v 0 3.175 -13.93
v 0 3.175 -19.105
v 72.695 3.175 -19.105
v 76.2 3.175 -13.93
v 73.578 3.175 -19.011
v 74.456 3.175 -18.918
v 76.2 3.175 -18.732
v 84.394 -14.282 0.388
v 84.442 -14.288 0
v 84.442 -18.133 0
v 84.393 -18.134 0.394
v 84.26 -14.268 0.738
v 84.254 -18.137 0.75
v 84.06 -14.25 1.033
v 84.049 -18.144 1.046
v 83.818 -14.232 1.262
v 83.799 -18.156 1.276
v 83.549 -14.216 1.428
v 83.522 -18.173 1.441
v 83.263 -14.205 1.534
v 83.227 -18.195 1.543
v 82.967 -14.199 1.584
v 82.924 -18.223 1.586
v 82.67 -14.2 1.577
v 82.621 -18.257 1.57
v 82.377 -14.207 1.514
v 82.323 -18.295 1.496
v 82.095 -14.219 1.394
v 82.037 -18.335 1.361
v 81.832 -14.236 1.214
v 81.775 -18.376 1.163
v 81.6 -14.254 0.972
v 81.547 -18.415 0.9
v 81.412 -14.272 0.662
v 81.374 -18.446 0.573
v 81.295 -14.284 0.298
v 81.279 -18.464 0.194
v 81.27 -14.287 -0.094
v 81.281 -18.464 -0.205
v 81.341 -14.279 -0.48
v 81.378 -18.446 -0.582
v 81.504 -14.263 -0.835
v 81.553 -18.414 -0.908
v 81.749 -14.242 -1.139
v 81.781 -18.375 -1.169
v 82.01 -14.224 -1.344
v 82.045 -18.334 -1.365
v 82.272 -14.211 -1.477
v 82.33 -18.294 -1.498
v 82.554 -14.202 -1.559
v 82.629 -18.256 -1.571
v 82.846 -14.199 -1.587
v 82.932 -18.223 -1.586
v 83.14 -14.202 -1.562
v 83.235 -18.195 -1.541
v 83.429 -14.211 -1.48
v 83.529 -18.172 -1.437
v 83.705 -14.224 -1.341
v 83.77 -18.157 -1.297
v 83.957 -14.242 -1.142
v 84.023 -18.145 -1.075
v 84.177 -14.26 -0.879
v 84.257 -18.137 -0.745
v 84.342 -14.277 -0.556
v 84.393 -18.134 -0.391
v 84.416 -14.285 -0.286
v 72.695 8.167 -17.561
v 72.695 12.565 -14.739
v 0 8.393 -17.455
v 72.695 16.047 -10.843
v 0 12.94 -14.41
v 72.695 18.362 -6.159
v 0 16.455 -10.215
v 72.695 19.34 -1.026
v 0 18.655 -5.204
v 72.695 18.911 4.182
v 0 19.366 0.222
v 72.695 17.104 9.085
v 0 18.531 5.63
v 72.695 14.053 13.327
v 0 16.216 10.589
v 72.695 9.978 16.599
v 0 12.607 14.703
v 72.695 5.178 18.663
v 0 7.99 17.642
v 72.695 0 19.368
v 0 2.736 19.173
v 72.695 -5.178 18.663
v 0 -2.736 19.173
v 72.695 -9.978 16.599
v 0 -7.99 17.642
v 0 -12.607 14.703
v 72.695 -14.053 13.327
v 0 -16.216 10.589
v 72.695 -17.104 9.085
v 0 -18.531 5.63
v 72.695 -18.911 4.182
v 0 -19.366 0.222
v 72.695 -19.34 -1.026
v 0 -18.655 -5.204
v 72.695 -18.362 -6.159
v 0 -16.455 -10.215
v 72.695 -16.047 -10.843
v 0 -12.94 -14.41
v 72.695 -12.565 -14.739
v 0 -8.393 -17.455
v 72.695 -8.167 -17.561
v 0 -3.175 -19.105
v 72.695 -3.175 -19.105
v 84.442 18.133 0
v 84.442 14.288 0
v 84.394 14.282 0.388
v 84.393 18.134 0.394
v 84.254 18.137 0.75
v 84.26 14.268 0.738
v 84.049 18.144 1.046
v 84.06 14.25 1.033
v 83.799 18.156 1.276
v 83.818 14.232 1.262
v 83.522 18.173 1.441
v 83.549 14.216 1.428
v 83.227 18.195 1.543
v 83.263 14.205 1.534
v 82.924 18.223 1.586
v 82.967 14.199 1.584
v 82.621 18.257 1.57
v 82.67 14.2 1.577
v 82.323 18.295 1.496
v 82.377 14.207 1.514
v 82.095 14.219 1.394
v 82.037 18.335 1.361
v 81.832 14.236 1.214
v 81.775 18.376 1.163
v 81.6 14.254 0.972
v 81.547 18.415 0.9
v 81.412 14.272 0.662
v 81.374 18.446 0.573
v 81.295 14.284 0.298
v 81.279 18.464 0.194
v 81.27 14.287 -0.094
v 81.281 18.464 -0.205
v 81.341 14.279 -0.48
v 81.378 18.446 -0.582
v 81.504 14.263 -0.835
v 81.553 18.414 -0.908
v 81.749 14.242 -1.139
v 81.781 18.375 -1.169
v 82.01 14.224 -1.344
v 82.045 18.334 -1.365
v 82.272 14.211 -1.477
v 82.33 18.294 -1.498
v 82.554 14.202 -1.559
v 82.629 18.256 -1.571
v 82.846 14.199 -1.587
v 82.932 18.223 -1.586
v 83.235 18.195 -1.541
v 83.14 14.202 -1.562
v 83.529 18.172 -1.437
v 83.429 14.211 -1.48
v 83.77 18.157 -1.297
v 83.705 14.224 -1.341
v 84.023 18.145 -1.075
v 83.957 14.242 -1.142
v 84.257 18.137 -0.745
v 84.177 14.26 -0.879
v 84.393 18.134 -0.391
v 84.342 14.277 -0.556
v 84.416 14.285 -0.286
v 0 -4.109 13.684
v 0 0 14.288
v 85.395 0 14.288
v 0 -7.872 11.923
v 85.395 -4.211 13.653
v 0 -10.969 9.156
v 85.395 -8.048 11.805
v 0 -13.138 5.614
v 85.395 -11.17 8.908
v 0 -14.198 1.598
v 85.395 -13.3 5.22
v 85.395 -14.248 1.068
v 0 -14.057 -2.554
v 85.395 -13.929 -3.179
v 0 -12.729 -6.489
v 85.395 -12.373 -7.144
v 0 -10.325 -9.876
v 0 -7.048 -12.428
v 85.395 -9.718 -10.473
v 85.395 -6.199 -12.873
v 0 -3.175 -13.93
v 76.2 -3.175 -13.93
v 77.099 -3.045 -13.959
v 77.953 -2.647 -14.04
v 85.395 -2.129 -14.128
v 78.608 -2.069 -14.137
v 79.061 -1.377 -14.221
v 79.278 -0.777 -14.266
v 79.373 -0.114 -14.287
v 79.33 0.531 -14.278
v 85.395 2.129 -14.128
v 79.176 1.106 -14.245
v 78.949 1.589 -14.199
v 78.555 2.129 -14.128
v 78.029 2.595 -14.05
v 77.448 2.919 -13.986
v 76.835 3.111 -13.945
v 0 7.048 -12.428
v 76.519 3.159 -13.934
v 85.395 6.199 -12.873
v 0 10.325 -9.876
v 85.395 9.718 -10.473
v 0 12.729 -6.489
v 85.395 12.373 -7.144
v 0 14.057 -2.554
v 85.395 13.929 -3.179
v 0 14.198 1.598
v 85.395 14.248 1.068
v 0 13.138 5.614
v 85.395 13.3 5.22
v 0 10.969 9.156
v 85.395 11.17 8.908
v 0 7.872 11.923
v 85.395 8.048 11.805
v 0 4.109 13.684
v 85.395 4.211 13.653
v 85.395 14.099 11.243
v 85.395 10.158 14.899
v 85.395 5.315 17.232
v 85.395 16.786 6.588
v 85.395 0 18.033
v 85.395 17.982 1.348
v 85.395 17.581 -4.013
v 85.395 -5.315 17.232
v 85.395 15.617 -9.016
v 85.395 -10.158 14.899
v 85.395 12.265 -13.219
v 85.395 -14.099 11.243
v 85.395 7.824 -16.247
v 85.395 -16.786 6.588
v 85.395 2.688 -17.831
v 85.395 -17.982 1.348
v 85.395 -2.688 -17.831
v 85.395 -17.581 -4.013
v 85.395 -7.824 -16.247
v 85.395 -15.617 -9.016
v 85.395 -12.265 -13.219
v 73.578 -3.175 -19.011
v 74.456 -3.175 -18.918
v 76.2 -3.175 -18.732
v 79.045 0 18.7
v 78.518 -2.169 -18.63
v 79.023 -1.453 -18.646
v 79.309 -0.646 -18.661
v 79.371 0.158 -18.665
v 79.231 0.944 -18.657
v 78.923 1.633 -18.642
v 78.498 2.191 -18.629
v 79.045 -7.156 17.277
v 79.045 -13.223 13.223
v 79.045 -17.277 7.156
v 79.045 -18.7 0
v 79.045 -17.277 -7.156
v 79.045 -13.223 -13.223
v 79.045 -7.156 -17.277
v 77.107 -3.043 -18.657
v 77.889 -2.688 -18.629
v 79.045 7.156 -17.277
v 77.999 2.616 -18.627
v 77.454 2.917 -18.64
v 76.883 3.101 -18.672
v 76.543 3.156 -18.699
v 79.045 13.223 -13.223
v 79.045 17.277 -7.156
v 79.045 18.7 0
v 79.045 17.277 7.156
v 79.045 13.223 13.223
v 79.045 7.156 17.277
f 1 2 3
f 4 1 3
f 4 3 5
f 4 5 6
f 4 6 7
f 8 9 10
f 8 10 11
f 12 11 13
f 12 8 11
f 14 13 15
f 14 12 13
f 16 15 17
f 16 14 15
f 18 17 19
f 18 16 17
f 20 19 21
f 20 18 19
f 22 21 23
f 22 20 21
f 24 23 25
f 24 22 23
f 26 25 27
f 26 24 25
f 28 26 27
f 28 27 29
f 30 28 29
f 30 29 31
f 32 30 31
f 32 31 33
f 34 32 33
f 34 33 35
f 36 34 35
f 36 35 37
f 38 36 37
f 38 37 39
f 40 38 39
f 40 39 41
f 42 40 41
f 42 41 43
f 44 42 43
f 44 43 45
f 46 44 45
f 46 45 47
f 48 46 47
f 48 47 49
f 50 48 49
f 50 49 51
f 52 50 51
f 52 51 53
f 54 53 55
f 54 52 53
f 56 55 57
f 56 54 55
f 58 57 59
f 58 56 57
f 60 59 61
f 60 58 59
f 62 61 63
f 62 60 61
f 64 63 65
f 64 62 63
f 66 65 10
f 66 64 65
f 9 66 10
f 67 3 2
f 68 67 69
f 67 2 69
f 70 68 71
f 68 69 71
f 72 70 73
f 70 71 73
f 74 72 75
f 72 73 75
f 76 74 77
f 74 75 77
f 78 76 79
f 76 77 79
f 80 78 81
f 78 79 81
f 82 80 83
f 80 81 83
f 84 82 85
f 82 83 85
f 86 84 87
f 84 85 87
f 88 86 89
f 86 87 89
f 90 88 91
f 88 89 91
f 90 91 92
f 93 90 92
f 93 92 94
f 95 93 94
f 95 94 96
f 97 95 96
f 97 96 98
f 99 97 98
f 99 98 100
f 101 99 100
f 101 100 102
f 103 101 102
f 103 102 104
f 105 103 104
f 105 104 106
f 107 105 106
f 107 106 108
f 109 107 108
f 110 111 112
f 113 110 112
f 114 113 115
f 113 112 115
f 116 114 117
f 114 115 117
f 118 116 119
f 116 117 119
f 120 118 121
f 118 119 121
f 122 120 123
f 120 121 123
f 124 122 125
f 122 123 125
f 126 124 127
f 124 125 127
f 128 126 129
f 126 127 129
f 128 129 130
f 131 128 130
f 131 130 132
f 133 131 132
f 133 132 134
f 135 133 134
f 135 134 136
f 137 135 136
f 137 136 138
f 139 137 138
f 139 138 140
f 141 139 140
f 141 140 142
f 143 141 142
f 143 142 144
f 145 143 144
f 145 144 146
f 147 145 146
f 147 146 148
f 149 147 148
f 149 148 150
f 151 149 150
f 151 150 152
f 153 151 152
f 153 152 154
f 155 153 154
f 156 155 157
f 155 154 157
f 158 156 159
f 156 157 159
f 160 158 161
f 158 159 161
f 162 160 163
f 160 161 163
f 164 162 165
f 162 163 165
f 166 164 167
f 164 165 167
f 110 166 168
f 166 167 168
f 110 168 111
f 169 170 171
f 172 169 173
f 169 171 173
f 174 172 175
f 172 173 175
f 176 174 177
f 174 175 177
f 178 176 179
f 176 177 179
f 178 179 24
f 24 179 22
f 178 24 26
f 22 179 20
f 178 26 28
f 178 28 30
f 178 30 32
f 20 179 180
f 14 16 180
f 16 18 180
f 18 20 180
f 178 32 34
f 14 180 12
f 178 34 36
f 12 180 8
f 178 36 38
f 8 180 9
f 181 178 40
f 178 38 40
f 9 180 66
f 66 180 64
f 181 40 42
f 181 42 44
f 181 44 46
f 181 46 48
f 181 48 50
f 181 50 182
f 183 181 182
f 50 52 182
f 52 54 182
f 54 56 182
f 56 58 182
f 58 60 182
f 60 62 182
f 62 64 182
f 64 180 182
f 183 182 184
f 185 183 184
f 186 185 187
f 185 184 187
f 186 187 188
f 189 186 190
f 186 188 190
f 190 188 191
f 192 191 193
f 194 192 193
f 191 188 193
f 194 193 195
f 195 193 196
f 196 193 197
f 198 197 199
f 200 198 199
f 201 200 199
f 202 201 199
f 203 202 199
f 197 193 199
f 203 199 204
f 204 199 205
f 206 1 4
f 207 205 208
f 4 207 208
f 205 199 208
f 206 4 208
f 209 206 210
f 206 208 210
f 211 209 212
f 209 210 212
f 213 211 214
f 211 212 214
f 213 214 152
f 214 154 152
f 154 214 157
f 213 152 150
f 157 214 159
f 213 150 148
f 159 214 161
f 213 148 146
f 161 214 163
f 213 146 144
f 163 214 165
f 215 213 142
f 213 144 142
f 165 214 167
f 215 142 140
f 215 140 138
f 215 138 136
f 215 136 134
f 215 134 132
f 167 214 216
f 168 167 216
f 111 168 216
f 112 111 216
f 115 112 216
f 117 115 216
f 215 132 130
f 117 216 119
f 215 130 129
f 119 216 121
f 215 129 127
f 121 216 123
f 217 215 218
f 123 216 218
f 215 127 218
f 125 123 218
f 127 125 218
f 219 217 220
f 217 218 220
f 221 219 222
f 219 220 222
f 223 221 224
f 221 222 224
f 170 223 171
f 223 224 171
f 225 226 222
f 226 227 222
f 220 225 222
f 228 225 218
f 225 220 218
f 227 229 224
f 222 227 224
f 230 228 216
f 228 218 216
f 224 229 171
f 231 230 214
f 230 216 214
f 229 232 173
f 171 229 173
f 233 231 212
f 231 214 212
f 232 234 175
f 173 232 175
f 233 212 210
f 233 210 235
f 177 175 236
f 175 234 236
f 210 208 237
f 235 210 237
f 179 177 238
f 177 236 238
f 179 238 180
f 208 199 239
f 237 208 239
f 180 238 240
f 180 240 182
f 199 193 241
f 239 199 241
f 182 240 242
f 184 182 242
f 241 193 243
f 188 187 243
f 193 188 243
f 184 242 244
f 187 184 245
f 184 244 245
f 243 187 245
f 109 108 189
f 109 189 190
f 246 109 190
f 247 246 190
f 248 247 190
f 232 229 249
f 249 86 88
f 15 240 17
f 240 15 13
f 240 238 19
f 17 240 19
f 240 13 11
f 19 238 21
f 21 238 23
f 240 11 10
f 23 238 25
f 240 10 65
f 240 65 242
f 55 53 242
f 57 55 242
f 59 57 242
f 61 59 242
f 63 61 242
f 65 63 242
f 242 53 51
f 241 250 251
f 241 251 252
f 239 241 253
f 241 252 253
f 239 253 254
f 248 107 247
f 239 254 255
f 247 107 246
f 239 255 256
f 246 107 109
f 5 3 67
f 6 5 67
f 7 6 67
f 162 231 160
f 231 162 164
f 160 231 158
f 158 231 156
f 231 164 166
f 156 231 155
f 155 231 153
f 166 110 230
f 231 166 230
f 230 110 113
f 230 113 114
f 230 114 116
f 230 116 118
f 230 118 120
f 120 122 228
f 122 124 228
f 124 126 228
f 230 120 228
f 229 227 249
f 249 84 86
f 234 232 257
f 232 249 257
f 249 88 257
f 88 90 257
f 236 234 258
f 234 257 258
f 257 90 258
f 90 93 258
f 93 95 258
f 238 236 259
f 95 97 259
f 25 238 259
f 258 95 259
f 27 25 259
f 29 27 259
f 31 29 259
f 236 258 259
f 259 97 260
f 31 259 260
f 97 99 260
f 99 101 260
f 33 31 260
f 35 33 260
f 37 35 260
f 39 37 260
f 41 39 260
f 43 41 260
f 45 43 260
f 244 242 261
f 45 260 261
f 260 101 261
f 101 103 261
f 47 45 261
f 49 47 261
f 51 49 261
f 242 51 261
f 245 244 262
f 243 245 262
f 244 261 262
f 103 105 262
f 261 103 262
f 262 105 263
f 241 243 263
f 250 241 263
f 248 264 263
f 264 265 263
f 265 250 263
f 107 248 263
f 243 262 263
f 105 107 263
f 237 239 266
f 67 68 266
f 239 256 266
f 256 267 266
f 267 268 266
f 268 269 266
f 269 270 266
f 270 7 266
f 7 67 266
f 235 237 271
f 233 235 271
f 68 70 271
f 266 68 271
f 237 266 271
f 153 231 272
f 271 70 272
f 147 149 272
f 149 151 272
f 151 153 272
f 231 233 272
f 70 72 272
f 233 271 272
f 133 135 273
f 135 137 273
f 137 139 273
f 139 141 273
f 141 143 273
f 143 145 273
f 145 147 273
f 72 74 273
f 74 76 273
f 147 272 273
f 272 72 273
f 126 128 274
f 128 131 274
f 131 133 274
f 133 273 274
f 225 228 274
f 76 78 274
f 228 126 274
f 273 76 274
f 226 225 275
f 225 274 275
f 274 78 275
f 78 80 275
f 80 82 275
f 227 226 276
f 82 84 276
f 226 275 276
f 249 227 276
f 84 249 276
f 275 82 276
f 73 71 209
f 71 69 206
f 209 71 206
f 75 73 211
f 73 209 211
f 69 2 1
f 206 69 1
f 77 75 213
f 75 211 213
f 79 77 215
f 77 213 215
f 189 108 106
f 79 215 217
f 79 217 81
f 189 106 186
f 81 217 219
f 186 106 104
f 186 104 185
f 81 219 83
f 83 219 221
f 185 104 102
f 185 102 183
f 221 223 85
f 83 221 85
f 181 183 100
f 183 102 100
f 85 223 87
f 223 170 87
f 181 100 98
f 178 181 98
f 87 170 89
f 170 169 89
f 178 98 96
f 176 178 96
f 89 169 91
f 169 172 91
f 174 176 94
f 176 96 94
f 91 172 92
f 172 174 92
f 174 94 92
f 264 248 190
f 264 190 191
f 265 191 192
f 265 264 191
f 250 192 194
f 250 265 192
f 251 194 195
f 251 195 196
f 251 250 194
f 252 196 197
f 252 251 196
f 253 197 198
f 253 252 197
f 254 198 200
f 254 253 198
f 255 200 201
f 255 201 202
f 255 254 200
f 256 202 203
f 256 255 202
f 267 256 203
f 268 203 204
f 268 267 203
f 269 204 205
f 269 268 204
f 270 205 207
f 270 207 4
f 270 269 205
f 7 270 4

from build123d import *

# Parameters (mm, degrees)
F2_R          = 1.5875
F3_DEPTH      = 19.3685
F3_DEPTH_BACK = 19.3685
F6_W          = 76.2
F6_H          = 6.35
F7_DEPTH      = 5.438244135


with BuildPart() as f1:
    # F0 (on Front) → F1 (revolve)
    with BuildSketch(Plane.XZ):
        Polygon((72.6948, 19.3675), (0, 19.3675), (0, 14.2875), (85.3948, 14.2875), (85.3948, 18.0326762121), align=None)
    revolve(axis=Axis((42.6974, 0, 0), (1, 0, 0)))

    # F2 (on Front) → F3 (cut, two sides)
    with BuildSketch(Plane.XZ) as f3_sk:
        with Locations((82.8548, 0)):
            Circle(F2_R)
    extrude(amount=-F3_DEPTH, mode=Mode.SUBTRACT)
    extrude(f3_sk.sketch, amount=F3_DEPTH_BACK, mode=Mode.SUBTRACT)

    # F6 (on plane+point) → F7 (cut, through all)
    with BuildSketch(Plane.XY.offset(-19.3675)):
        with Locations((38.1, 0)):
            Rectangle(F6_W, F6_H)
        with BuildLine():
            ThreePointArc((76.2, -3.175), (79.375, 0), (76.2, 3.175))
            Line((76.2, 3.175), (76.2, -3.175))
        make_face()
    extrude(amount=F7_DEPTH, mode=Mode.SUBTRACT)


solid = f1.part
